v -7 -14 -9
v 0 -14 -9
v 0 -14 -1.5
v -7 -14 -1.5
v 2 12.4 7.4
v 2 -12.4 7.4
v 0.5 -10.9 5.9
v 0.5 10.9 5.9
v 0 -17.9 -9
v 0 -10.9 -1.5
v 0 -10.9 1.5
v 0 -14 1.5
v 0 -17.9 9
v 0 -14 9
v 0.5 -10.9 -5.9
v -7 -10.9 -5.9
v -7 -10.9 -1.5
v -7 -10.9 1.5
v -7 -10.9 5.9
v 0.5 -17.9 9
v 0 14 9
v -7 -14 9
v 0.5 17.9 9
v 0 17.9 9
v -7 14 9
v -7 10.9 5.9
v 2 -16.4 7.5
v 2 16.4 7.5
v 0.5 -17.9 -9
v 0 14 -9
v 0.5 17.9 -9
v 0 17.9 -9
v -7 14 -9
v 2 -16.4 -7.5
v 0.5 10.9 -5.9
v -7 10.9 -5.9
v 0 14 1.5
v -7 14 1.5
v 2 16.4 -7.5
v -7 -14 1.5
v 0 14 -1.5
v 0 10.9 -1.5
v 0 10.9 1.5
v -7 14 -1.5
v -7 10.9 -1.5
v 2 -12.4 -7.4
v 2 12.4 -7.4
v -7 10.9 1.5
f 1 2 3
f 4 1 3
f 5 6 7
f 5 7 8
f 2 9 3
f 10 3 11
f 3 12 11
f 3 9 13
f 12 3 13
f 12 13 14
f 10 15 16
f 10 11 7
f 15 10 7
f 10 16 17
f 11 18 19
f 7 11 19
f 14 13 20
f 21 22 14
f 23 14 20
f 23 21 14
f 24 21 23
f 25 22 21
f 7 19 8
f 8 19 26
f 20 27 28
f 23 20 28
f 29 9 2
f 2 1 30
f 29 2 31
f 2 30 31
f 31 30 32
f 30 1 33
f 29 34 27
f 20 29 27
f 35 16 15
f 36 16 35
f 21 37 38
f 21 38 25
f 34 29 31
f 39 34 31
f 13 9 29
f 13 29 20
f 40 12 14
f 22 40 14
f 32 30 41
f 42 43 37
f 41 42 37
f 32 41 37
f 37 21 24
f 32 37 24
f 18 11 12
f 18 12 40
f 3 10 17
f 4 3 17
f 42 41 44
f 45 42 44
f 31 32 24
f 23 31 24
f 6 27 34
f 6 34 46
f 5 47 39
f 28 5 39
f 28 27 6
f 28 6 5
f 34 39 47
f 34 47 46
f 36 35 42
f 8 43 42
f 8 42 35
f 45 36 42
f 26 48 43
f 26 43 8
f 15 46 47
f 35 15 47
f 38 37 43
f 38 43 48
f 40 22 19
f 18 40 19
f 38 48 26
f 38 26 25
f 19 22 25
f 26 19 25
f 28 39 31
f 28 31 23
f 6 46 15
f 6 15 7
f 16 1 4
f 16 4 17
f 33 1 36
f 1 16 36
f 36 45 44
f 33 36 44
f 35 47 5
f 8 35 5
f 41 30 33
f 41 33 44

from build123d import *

# Parameters (mm, degrees)
F0_W     = 28
F0_H     = 18
F0_W_2   = 21.8
F0_H_2   = 11.8
F1_DEPTH = 7
F2_W     = 35.8
F2_H     = 18
F2_W_2   = 21.8
F2_H_2   = 11.8
F3_DEPTH = 2
F4_W     = 7
F4_H     = 3
F5_DEPTH = 31.901
F6_SIZE  = 1.5


with BuildPart() as f1:
    # F0 (on Right) → F1 (new body)
    with BuildSketch(Plane.YZ):
        Rectangle(F0_W, F0_H)
        Rectangle(F0_W_2, F0_H_2, mode=Mode.SUBTRACT)
    extrude(amount=-F1_DEPTH)

    # F2 (on face) → F3 (join)
    with BuildSketch(Plane.YZ):
        Rectangle(F2_W, F2_H)
        Rectangle(F2_W_2, F2_H_2, mode=Mode.SUBTRACT)
    extrude(amount=F3_DEPTH)

    # F4 (on face) → F5 (cut, through all)
    with BuildSketch(Plane(origin=(0, 14, 0), x_dir=(-1, 0, 0), z_dir=(0, 1, 0))):
        with Locations((3.5, 0)):
            Rectangle(F4_W, F4_H)
    extrude(amount=-F5_DEPTH, mode=Mode.SUBTRACT)

    # F6
    f6_edges = [f1.edges().sort_by_distance(p)[0] for p in [
        (2, 17.9, 0),
        (2, 0, 9),
        (2, -17.9, 0),
        (2, 0, -9),
        (2, 0, 5.9),
        (2, 10.9, 0),
        (2, 0, -5.9),
        (2, -10.9, 0),
    ]]
    chamfer(f6_edges, length=F6_SIZE)


solid = f1.part
